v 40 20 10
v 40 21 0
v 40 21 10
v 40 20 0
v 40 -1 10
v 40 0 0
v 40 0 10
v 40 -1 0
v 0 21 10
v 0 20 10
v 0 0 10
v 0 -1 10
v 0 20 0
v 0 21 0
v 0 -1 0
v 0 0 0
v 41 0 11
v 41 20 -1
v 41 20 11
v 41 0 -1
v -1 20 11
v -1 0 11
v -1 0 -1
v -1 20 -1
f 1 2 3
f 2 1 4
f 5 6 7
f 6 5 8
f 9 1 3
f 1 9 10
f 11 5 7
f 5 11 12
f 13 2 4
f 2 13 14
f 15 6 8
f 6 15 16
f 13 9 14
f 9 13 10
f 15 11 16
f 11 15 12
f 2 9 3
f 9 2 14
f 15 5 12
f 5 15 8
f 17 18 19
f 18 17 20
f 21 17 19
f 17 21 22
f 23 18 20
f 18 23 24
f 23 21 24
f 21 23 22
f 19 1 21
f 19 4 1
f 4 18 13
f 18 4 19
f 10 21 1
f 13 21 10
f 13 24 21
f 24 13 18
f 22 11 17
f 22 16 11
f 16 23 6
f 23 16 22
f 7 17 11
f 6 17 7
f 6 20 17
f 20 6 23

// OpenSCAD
// Unit of length: Unit.MM
union()
{
   color(c = [1.0, 0.0, 0.0, 1.0])
   {
      translate(v = [0.0, -1.0, 0.0])
      {
         cube(size = [40.0, 22.0, 10.0], center = false);
      }
   }
   translate(v = [-1.0, 0.0, -1.0])
   {
      cube(size = [42.0, 20.0, 12.0], center = false);
   }
}
